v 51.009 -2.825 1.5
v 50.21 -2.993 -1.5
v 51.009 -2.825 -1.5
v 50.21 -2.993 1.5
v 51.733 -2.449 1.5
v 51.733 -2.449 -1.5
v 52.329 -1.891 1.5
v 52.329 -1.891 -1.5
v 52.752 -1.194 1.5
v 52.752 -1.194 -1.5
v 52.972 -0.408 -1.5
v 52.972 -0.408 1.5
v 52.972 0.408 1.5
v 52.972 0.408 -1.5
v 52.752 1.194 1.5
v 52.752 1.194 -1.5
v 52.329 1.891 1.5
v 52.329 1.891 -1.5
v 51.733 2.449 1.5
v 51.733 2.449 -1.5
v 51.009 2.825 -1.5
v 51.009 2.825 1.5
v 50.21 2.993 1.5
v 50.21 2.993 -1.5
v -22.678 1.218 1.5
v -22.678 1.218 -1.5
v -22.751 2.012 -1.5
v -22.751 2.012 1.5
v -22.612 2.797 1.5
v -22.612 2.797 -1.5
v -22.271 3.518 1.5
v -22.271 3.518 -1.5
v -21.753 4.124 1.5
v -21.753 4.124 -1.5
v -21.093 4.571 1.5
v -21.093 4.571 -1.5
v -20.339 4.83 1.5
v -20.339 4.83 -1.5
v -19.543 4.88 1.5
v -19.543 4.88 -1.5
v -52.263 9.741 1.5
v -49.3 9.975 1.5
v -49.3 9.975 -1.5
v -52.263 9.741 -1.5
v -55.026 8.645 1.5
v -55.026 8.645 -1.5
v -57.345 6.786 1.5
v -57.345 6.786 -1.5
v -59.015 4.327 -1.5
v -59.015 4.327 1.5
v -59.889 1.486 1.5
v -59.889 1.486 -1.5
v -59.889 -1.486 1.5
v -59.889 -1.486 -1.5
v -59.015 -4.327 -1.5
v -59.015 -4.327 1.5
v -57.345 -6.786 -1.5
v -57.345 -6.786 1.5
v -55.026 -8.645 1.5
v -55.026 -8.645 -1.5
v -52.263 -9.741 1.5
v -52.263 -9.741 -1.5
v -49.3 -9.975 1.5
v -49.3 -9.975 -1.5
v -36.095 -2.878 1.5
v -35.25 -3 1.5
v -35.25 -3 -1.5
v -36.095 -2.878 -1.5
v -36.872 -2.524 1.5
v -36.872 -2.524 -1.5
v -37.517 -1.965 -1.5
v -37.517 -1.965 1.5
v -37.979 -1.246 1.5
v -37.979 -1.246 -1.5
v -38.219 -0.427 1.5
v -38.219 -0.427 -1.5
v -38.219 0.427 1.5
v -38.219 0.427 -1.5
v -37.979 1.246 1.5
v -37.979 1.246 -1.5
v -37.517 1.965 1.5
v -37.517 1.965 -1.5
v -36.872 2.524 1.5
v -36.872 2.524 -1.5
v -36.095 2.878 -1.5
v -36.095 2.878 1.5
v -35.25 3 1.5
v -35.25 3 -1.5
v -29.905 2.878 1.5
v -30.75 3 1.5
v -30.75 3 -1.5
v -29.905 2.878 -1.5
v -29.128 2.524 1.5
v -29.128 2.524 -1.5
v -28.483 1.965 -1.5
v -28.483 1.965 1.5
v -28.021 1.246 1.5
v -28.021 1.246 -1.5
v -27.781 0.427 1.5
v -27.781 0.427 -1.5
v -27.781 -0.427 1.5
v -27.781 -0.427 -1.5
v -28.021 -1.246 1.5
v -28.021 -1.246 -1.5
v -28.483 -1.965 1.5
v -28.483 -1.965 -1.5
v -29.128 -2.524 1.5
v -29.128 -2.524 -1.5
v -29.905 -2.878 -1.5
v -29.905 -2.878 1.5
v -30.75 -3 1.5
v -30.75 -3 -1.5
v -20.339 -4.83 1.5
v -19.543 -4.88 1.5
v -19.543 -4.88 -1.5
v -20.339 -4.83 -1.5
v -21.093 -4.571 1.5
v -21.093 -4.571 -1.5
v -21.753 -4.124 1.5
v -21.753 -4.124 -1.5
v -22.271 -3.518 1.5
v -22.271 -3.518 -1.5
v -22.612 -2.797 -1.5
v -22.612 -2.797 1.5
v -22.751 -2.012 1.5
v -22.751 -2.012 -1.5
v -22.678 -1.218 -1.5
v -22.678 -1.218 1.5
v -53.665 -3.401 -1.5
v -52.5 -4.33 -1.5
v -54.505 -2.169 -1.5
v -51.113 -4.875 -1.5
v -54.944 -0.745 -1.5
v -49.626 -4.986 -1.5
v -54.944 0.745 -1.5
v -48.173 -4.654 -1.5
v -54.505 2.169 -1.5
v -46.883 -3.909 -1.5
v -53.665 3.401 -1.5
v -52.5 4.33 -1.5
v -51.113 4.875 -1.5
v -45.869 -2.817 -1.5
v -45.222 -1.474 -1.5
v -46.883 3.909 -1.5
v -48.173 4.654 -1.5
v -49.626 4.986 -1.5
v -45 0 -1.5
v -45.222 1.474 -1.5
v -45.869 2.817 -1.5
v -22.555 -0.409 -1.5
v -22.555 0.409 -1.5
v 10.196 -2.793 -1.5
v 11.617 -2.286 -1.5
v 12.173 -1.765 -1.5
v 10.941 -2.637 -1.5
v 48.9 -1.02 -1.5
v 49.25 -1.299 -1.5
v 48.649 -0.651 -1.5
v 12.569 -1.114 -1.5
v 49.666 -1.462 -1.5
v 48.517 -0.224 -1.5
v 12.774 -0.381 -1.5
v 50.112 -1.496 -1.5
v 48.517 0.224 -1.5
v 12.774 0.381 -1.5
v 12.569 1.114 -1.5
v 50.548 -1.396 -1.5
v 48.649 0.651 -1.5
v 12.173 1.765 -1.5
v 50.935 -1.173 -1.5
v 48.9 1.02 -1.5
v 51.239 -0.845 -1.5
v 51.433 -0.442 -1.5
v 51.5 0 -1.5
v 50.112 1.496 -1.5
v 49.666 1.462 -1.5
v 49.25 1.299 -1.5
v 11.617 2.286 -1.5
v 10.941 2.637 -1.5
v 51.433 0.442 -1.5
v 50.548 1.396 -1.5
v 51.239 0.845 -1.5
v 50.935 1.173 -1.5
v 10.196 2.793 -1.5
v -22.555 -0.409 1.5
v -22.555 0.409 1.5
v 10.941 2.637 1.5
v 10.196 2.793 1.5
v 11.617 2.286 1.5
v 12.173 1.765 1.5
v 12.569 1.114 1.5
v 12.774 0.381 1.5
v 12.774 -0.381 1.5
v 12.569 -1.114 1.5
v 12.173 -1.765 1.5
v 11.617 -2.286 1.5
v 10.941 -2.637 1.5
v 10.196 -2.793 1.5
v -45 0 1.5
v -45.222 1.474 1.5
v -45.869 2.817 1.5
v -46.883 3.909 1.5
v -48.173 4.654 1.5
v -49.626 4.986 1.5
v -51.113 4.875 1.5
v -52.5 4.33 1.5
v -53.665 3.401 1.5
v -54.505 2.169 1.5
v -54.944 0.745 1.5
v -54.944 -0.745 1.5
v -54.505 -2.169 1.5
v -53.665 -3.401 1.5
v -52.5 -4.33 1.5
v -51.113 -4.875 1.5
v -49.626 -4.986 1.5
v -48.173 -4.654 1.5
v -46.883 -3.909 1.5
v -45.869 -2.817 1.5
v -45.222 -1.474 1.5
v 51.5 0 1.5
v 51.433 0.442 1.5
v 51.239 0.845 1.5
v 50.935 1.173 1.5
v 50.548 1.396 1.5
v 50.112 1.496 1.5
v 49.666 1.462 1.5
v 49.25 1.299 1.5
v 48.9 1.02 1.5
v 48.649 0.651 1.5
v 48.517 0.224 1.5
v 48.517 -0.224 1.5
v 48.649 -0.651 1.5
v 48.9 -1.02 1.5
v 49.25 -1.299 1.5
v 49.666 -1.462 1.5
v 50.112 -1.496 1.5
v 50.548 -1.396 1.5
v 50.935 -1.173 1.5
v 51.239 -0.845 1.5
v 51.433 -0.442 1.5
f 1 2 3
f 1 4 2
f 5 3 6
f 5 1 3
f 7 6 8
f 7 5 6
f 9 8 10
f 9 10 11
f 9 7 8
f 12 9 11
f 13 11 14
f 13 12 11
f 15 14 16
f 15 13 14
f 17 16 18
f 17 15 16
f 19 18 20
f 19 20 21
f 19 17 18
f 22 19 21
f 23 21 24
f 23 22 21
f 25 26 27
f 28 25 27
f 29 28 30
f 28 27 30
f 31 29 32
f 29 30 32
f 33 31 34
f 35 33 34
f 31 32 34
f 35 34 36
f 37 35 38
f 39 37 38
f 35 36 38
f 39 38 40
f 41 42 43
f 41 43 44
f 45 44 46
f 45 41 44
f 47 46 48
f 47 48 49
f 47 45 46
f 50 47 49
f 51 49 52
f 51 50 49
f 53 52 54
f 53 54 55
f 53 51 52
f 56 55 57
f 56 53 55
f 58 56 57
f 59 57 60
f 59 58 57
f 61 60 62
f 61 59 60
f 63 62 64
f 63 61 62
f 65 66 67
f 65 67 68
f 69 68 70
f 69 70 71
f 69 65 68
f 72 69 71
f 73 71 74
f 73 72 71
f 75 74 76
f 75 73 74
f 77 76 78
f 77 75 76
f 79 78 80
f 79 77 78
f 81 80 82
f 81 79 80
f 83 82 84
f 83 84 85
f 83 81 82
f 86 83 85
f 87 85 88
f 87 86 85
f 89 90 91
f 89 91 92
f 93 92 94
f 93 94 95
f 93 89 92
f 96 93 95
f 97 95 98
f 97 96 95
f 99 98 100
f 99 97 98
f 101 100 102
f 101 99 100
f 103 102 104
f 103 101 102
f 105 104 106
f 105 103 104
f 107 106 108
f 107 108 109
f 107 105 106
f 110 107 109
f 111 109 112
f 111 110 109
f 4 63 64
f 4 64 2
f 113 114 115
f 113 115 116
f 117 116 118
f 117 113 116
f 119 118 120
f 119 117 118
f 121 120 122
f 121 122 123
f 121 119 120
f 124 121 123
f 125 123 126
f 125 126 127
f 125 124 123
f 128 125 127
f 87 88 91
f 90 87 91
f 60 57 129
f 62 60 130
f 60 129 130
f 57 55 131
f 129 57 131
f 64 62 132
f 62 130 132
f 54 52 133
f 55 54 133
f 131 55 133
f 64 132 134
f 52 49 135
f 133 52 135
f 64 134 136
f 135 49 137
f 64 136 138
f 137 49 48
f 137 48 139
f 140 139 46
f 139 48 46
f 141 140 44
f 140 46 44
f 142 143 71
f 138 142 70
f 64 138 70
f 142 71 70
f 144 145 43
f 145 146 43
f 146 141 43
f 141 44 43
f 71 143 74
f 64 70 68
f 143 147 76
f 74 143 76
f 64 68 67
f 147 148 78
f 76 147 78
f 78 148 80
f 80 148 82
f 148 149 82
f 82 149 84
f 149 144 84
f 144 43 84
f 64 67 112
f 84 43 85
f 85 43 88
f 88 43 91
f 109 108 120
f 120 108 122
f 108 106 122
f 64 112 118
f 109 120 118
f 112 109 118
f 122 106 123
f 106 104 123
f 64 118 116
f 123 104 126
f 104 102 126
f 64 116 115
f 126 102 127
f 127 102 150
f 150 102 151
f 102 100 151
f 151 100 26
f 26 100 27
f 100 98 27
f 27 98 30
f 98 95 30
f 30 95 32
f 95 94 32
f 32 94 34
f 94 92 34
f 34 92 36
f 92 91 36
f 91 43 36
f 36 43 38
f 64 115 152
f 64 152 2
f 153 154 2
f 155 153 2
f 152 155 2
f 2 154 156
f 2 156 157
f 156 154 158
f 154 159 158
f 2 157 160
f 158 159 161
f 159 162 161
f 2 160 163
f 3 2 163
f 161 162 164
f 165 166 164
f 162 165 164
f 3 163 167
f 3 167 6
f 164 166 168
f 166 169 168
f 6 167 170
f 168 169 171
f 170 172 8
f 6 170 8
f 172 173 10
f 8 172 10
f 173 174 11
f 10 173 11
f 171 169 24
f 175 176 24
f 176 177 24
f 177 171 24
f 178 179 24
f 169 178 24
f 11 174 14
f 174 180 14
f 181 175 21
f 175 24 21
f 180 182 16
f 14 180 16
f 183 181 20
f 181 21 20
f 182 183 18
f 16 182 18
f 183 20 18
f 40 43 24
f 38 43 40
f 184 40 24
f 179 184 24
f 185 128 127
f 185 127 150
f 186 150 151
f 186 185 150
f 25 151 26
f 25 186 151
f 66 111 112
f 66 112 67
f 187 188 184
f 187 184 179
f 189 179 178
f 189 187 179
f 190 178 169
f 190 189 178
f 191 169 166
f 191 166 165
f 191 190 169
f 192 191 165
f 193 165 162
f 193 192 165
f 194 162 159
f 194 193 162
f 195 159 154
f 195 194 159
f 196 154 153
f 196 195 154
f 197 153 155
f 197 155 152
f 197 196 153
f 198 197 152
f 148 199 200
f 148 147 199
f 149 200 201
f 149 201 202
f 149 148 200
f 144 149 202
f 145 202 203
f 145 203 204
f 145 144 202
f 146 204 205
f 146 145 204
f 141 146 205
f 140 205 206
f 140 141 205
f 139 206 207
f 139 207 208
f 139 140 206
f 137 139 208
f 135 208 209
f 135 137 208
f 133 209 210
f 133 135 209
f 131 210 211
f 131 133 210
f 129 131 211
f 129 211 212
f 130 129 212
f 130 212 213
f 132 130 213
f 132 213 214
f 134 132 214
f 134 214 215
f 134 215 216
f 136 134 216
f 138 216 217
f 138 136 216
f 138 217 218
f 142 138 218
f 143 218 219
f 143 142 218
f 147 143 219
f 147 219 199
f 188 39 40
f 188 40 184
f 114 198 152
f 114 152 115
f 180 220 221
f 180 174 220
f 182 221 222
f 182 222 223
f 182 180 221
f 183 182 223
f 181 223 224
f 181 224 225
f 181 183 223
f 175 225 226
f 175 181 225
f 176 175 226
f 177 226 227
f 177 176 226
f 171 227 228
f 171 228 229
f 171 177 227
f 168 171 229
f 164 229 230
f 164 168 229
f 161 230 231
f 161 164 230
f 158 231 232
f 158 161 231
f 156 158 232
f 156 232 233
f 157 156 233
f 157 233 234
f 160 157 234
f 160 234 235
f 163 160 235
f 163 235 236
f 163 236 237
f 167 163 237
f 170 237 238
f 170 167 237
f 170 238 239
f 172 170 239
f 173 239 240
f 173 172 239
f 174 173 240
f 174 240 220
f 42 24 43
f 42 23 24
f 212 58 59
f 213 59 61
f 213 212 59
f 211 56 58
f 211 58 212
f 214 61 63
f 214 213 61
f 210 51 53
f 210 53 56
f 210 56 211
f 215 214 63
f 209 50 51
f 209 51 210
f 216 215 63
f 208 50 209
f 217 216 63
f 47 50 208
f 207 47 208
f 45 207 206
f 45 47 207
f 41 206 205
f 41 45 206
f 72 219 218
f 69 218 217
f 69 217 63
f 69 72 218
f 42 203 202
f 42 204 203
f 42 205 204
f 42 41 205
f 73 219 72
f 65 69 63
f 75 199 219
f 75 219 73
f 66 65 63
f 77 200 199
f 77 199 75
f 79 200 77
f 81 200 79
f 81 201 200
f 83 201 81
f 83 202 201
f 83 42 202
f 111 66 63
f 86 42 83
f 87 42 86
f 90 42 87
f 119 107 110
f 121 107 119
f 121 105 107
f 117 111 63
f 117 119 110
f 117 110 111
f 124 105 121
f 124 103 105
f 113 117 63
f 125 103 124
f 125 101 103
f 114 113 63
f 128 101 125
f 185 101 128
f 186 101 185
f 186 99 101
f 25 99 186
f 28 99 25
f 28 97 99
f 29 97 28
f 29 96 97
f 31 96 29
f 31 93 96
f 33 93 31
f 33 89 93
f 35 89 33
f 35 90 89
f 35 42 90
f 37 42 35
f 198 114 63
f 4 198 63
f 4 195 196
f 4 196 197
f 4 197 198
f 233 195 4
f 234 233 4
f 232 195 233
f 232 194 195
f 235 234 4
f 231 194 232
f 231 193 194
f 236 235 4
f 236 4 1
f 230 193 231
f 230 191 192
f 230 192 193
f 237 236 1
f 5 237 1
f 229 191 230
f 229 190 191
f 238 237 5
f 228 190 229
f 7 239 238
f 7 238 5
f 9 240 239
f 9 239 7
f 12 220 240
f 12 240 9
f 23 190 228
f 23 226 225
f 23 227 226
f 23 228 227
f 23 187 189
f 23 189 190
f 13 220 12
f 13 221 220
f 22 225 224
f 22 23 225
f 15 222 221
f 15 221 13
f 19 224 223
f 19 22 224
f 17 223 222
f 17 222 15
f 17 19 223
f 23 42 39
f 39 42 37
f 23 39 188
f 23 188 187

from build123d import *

# Parameters (mm, degrees)
F0_R     = 5
F0_R_2   = 1.5
F1_DEPTH = 1.5


with BuildPart() as f1:
    # F0 (on Top) → F1 (new body, symmetric)
    with BuildSketch(Plane.XY):
        with BuildLine():
            Line((50.21, 2.9926409741), (-49.3, 9.9754699137))
            ThreePointArc((-49.3, 9.9754699137), (-60, 0), (-49.3, -9.9754699137))
            Line((-49.3, -9.9754699137), (50.21, -2.9926409741))
            ThreePointArc((50.21, -2.9926409741), (53, 0), (50.21, 2.9926409741))
        make_face()
        with Locations((-50, 0)):
            Circle(F0_R, mode=Mode.SUBTRACT)
        with BuildLine():
            ThreePointArc((-35.25, -3), (-38.25, 0), (-35.25, 3))
            Line((-35.25, 3), (-30.75, 3))
            ThreePointArc((-30.75, 3), (-27.75, 0), (-30.75, -3))
            Line((-30.75, -3), (-35.25, -3))
        make_face(mode=Mode.SUBTRACT)
        with BuildLine():
            ThreePointArc((-19.5432131994, -4.8799955952), (-22.0323332526, -3.838152351), (-22.6776056819, -1.2180799328))
            ThreePointArc((-22.6776056819, -1.2180799328), (-22.54, 0), (-22.6776056819, 1.2180799328))
            ThreePointArc((-22.6776056819, 1.2180799328), (-22.0323332526, 3.838152351), (-19.5432131994, 4.8799955952))
            Line((-19.5432131994, 4.8799955952), (10.196, 2.7931315758))
            ThreePointArc((10.196, 2.7931315758), (12.8, 0), (10.196, -2.7931315758))
            Line((10.196, -2.7931315758), (-19.5432131994, -4.8799955952))
        make_face(mode=Mode.SUBTRACT)
        with Locations((50, 0)):
            Circle(F0_R_2, mode=Mode.SUBTRACT)
    extrude(amount=F1_DEPTH, both=True)


solid = f1.part
